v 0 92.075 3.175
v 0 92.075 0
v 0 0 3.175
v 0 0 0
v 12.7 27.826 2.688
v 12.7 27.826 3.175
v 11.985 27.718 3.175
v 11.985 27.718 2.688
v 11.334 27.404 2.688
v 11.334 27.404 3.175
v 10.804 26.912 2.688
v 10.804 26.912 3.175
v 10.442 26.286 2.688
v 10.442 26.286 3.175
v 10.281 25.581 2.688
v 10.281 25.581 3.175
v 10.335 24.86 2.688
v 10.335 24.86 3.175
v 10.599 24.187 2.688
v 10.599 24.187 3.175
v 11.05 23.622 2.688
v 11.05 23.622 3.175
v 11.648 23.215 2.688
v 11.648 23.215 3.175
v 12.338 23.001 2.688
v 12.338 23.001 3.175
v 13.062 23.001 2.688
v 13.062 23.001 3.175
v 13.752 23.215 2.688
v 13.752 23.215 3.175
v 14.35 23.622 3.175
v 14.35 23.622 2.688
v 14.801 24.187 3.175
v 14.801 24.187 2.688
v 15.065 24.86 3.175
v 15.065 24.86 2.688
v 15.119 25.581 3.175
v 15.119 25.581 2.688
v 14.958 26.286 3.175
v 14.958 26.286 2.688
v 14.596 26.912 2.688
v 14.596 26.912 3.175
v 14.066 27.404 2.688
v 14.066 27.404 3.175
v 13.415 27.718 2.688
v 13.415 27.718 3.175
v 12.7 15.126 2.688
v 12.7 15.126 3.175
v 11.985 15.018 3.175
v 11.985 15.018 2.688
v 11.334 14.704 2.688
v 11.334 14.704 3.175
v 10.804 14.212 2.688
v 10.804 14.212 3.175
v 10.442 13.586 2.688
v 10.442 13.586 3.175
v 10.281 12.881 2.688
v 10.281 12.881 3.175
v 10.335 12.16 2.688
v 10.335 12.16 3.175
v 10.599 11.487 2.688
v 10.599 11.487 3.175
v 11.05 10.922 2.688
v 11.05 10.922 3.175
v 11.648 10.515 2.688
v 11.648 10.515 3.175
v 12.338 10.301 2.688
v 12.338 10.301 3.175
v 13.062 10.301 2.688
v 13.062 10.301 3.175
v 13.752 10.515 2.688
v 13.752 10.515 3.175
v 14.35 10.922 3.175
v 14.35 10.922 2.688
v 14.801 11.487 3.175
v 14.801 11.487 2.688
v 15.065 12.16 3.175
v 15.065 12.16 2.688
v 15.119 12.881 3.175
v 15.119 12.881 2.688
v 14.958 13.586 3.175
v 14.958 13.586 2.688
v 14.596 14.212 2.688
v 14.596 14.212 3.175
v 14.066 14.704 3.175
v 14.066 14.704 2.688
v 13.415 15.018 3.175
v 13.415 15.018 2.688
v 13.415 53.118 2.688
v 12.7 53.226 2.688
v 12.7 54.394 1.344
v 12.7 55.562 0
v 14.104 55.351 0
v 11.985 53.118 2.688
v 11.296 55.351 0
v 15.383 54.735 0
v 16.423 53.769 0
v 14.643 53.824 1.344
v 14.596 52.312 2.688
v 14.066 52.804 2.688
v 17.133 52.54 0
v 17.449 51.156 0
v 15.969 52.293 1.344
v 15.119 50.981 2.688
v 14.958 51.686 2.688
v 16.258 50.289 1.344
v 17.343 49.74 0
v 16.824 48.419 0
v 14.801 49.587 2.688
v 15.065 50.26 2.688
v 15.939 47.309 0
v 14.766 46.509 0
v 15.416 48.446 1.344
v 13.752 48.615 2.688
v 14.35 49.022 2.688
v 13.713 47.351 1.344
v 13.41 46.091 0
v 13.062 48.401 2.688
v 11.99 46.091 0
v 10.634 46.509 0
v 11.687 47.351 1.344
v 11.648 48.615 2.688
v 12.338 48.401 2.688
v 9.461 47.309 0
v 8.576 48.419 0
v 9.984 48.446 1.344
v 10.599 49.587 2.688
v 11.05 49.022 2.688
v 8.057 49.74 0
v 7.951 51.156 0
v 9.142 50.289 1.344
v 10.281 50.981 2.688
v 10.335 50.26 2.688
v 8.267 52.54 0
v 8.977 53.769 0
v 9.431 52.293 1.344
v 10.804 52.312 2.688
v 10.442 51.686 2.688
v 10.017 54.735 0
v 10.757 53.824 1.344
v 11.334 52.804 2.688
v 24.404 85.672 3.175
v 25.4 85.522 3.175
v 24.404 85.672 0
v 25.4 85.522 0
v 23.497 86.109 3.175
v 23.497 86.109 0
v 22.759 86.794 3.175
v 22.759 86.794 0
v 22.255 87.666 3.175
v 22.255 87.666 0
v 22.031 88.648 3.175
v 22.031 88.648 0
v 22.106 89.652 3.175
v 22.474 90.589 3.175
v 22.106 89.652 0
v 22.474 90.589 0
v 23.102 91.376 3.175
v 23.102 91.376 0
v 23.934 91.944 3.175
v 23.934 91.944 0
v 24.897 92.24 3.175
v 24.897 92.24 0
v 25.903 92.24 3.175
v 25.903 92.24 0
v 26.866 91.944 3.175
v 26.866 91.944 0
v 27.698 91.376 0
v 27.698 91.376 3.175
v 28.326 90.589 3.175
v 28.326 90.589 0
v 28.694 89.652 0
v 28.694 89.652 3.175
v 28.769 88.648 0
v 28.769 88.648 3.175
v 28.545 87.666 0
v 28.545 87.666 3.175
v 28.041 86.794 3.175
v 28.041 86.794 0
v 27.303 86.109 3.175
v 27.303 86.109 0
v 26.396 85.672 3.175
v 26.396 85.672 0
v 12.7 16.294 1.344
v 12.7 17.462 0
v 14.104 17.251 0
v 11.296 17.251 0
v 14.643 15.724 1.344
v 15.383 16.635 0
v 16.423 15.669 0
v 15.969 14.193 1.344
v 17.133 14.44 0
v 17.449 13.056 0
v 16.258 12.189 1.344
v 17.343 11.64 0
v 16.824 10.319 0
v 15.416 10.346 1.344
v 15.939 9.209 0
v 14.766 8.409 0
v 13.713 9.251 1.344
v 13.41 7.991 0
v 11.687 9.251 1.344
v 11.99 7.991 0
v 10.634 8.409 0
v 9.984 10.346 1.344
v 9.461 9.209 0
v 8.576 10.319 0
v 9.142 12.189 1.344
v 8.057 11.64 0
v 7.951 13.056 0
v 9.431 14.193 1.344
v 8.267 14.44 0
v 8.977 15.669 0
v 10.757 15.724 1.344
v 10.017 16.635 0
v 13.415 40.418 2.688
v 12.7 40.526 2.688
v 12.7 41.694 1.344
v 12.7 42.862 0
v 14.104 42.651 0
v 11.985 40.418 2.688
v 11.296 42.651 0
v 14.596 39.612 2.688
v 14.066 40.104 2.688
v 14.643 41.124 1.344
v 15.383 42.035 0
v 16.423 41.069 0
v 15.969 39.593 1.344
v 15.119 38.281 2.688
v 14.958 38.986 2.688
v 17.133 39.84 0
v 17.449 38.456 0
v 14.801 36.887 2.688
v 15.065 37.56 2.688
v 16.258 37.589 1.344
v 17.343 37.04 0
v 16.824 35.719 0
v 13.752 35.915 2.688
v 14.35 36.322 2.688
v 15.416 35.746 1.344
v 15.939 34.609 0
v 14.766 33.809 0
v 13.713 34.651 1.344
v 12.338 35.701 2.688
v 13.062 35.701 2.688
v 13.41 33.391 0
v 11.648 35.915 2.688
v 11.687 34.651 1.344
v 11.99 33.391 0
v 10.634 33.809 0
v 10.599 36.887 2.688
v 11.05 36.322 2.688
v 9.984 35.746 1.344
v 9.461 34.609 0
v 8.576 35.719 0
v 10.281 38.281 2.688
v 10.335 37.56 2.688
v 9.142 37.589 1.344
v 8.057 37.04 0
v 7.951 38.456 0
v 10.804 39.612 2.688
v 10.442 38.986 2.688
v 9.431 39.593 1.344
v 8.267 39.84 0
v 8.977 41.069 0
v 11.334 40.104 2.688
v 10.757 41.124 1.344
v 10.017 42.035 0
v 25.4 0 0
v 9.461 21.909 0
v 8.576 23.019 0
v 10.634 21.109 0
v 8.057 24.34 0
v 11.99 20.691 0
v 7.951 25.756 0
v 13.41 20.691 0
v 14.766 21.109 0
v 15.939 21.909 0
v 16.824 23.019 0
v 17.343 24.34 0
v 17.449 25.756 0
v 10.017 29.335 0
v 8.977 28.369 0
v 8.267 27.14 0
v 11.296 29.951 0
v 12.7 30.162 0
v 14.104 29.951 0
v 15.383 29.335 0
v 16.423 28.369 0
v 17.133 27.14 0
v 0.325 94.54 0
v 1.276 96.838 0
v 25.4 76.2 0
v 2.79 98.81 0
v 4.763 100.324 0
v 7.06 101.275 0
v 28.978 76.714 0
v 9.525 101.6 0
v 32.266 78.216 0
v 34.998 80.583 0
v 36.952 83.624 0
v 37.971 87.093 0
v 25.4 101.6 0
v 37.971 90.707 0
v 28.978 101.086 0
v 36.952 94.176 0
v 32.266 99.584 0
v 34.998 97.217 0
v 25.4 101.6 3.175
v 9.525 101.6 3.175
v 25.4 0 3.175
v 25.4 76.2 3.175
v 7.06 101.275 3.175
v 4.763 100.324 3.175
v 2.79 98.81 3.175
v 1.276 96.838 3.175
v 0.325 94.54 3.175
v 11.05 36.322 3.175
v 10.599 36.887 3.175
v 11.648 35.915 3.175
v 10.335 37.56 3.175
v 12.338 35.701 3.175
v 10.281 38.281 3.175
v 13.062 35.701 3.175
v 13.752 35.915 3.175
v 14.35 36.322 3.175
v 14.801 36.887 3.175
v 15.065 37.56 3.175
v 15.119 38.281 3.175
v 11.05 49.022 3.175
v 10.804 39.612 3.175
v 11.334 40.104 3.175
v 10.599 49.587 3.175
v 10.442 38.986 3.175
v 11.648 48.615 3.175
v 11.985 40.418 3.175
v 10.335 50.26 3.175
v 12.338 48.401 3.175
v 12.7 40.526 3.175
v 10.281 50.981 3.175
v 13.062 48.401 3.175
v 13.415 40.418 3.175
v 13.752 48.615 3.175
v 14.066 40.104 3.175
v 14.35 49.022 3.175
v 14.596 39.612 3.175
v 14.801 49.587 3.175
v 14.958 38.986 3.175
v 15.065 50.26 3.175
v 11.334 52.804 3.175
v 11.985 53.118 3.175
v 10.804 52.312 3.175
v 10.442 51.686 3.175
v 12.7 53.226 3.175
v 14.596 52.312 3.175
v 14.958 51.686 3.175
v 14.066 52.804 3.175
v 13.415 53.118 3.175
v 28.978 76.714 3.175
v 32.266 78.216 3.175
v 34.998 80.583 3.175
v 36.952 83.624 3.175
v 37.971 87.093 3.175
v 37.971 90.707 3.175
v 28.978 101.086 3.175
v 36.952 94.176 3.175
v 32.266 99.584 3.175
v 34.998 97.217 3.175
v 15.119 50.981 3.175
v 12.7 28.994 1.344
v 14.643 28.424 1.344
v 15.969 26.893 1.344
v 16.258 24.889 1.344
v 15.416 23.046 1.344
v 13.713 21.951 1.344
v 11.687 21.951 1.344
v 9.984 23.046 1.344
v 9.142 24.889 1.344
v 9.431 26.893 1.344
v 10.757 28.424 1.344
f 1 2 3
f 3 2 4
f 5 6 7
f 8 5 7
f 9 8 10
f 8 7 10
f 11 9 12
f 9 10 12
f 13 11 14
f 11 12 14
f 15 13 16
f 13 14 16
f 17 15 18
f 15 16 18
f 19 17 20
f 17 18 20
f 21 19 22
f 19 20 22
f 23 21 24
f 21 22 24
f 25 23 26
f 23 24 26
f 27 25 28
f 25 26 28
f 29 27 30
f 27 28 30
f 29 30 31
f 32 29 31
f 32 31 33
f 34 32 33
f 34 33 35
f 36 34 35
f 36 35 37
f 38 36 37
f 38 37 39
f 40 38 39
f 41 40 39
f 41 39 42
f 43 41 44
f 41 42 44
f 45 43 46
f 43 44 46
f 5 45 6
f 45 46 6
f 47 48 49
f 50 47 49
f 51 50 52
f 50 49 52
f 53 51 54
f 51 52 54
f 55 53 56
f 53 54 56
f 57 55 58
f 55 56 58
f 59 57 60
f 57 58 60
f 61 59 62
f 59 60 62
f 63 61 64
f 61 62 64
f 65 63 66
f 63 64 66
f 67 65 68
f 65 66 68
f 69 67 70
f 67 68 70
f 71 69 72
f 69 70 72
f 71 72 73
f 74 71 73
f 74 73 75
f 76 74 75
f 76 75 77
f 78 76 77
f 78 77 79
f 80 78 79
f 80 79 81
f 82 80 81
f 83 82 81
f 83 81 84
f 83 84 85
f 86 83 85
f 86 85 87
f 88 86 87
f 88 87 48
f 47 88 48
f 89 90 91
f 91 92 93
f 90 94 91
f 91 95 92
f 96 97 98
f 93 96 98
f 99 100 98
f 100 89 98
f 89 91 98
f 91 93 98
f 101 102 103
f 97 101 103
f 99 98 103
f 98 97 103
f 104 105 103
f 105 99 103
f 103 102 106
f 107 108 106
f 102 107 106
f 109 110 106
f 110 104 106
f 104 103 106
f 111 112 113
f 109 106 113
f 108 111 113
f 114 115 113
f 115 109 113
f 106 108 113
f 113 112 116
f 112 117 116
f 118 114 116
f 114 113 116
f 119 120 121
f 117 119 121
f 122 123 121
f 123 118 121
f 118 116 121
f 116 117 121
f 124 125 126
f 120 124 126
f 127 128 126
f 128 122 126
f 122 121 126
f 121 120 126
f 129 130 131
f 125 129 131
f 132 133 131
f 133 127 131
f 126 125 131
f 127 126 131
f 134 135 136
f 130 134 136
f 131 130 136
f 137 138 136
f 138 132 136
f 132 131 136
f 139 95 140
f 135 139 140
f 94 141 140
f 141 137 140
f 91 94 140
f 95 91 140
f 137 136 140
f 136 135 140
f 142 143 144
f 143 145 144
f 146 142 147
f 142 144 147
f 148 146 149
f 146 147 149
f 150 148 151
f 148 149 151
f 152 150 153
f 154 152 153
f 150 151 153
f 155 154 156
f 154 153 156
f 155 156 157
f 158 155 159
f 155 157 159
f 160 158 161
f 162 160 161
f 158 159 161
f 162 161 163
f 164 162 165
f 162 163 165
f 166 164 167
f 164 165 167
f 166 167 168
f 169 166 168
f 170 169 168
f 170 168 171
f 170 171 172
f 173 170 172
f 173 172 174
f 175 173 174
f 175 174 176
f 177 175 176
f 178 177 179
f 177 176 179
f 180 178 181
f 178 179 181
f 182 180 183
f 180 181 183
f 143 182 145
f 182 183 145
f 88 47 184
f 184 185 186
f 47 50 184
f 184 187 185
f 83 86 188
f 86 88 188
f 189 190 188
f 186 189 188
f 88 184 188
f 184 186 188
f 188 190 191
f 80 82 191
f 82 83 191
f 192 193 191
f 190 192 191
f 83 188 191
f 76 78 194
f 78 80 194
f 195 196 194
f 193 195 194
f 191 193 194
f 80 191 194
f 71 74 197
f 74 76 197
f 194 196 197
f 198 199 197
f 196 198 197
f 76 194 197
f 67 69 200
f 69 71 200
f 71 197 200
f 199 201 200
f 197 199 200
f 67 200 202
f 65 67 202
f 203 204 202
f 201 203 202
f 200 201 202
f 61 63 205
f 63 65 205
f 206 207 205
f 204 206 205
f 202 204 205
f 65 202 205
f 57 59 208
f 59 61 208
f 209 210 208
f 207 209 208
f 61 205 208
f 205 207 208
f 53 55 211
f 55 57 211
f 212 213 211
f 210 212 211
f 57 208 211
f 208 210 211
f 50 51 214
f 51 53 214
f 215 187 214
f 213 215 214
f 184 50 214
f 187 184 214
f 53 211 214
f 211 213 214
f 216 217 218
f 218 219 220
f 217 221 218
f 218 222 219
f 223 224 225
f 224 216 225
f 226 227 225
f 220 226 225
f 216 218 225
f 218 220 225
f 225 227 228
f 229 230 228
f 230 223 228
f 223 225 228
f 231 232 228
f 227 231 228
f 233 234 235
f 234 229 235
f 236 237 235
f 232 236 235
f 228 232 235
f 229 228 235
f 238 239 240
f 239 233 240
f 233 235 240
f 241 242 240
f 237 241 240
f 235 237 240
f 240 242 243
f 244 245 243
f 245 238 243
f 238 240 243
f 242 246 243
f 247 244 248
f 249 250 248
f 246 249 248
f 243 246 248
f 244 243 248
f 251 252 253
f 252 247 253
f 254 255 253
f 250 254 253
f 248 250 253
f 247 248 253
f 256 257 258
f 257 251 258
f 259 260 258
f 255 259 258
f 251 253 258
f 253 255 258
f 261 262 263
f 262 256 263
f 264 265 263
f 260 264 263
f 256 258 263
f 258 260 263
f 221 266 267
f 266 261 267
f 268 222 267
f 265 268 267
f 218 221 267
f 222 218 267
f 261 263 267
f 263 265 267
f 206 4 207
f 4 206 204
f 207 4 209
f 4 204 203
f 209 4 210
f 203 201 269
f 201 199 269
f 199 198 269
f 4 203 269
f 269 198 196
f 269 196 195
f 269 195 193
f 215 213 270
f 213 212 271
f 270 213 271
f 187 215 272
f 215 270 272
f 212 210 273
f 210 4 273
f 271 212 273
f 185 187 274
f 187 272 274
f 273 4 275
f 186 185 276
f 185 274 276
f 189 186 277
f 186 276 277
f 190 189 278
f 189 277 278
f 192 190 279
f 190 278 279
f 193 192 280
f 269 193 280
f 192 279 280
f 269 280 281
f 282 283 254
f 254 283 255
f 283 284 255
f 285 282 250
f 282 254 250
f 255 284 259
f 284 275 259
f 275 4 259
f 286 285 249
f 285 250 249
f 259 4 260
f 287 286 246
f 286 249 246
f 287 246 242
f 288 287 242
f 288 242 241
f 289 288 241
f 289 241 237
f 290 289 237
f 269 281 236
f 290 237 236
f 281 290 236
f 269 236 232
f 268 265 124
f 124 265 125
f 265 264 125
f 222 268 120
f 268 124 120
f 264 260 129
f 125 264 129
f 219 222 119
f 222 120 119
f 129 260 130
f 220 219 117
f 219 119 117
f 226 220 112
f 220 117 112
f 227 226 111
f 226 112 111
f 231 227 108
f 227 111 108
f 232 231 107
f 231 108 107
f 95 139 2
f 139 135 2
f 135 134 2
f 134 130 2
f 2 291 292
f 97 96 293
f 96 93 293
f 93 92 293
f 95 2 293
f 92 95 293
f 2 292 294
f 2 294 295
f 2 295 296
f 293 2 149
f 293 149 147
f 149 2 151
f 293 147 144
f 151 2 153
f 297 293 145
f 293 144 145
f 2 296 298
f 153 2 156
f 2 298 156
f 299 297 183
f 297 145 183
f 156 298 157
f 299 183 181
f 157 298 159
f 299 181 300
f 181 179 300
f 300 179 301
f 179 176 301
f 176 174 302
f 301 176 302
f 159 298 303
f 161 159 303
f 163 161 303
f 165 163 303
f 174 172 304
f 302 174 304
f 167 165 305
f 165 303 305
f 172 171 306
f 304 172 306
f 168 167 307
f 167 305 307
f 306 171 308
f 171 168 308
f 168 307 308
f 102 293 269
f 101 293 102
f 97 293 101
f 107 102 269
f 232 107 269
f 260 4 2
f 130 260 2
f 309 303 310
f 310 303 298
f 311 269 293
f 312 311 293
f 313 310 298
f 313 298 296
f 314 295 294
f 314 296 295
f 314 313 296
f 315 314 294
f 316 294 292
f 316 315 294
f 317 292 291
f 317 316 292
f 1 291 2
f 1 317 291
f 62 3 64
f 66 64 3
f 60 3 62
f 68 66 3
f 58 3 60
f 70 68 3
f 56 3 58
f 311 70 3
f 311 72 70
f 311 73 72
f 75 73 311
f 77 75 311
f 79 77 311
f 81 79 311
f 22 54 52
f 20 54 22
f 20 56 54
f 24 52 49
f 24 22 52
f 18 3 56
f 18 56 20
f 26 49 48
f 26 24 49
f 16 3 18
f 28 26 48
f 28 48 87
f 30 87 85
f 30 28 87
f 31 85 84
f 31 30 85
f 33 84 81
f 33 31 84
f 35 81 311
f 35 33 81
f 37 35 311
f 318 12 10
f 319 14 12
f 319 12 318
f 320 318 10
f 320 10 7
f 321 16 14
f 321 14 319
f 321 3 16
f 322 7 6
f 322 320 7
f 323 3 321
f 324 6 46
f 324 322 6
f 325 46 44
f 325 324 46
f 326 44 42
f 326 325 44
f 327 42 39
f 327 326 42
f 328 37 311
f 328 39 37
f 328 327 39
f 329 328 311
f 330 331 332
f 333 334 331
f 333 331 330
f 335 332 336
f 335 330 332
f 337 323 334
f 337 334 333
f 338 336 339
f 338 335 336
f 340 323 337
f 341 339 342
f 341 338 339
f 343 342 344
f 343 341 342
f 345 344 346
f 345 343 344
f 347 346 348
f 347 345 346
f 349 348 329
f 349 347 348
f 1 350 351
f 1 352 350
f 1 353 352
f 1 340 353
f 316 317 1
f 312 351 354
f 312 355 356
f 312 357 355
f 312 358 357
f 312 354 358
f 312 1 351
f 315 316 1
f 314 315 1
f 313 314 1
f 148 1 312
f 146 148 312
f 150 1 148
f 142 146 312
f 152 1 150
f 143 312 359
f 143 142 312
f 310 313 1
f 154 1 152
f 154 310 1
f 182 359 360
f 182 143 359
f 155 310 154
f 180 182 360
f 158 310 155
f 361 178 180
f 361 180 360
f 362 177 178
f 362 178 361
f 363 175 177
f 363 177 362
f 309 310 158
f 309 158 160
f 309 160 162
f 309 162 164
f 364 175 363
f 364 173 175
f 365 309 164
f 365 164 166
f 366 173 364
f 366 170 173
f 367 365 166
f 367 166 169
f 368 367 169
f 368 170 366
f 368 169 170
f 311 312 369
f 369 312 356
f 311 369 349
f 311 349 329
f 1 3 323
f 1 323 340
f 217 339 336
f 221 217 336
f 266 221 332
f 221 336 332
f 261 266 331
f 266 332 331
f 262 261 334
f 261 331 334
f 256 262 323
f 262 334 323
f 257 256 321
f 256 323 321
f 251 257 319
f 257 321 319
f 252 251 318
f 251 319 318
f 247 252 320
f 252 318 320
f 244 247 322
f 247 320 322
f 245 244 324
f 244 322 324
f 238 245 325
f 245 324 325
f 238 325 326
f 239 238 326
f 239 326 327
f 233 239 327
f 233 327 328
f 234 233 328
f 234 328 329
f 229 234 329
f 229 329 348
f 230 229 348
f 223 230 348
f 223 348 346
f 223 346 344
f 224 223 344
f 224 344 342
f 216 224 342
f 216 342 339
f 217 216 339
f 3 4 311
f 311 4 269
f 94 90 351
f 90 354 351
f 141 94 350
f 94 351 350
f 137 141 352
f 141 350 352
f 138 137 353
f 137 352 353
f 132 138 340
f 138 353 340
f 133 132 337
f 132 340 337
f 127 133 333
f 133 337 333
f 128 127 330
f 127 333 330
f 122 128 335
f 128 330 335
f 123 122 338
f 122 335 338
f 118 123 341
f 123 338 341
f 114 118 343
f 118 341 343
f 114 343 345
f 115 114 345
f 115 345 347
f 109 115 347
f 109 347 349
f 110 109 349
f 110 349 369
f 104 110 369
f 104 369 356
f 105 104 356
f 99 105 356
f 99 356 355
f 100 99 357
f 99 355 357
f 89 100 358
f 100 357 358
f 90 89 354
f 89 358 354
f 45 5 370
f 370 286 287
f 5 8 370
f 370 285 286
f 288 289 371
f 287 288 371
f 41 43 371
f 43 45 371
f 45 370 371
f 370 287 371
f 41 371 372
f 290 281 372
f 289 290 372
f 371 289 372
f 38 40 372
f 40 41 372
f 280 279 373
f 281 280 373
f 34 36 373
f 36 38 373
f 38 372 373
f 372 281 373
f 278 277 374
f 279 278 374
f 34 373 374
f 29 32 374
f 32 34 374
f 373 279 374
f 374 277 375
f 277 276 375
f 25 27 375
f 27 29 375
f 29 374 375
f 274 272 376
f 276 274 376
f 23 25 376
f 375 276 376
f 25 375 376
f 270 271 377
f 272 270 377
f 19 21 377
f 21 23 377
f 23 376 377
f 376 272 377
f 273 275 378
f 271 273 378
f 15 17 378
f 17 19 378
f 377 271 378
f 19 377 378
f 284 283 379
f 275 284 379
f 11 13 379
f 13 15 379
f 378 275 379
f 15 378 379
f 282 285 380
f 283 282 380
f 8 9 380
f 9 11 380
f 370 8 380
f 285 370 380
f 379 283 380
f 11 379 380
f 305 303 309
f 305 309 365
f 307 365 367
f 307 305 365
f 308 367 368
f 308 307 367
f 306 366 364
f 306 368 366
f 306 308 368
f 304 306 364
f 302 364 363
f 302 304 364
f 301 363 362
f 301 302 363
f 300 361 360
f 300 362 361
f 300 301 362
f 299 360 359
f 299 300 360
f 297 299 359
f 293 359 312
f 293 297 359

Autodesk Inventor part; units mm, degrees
ref_plane "YZ Plane" through (0, 0, 0) normal (1, 0, 0) x (0, 1, 0)
ref_plane "XZ Plane" through (0, 0, 0) normal (0, 1, 0) x (-1, 0, 0)
ref_plane "XY Plane" through (0, 0, 0) normal (0, 0, 1) x (1, 0, 0)
sketch "Sketch1" plane through (0, 0, 0) normal (0, 0, 1) x (1, 0, 0)
  line L0 (0, 0) -> (25.4, 0)
  line L1 (25.4, 0) -> (25.4, 101.6)
  line L2 (25.4, 101.6) -> (0, 101.6)
  line L3 (0, 101.6) -> (0, 0)
  arc A0 (25.4, 76.2) -> (25.4, 101.6) centre (25.4, 88.9) ccw
  dimension "d0" = 101.6
  dimension "d1" = 25.4
  dimension "d2" = 25.4
extrude "Extrusion1" add sketch "Sketch1" along normal blind 3.175
sketch "Sketch4" plane through (0, 0, 3.175) normal (0, 0, 1) x (1, 0, 0)
  line L0 (25.4, 0) -> (25.4, 76.2) projected
  arc A0 (25.4, 76.2) -> (25.4, 101.6) centre (25.4, 88.9) ccw projected
  point P0 (0, 0)
hole "Hole2" at (25.4, 88.9, 3.175) direction (0, 0, -1) diameter 6.7564 end through all clearance for "Flat Head Machine Screw (82)" size "1/4" standard "Ansi Unified Screw Threads"
fillet "Fillet1" radius 9.525 1 edges at (0, 101.6, 1.5875)
sketch "Sketch6" plane through (0, 0, 0) normal (0, 0, -1) x (-1, 0, 0)
  line L0 (-9.525, 101.6) -> (-25.4, 101.6) projected
  line L1 (0, 92.075) -> (0, 0) projected
  point P0 (-12.7, 50.8)
  dimension "d52" = 50.8
  dimension "d63" = 12.7
hole "Hole3" at (12.7, 50.8, 0) direction (0, 0, 1) diameter 4.8514 end through all countersink diameter 9.525 countersink angle 82
pattern_linear "Rectangular Pattern1" count 4 spacing 12.7 along (0, -1, 0) of "Hole3"
equation "\"d2\" = d1"
properties part number "CLB_027_LifterBracketLeft" material "Aluminum 6061"
